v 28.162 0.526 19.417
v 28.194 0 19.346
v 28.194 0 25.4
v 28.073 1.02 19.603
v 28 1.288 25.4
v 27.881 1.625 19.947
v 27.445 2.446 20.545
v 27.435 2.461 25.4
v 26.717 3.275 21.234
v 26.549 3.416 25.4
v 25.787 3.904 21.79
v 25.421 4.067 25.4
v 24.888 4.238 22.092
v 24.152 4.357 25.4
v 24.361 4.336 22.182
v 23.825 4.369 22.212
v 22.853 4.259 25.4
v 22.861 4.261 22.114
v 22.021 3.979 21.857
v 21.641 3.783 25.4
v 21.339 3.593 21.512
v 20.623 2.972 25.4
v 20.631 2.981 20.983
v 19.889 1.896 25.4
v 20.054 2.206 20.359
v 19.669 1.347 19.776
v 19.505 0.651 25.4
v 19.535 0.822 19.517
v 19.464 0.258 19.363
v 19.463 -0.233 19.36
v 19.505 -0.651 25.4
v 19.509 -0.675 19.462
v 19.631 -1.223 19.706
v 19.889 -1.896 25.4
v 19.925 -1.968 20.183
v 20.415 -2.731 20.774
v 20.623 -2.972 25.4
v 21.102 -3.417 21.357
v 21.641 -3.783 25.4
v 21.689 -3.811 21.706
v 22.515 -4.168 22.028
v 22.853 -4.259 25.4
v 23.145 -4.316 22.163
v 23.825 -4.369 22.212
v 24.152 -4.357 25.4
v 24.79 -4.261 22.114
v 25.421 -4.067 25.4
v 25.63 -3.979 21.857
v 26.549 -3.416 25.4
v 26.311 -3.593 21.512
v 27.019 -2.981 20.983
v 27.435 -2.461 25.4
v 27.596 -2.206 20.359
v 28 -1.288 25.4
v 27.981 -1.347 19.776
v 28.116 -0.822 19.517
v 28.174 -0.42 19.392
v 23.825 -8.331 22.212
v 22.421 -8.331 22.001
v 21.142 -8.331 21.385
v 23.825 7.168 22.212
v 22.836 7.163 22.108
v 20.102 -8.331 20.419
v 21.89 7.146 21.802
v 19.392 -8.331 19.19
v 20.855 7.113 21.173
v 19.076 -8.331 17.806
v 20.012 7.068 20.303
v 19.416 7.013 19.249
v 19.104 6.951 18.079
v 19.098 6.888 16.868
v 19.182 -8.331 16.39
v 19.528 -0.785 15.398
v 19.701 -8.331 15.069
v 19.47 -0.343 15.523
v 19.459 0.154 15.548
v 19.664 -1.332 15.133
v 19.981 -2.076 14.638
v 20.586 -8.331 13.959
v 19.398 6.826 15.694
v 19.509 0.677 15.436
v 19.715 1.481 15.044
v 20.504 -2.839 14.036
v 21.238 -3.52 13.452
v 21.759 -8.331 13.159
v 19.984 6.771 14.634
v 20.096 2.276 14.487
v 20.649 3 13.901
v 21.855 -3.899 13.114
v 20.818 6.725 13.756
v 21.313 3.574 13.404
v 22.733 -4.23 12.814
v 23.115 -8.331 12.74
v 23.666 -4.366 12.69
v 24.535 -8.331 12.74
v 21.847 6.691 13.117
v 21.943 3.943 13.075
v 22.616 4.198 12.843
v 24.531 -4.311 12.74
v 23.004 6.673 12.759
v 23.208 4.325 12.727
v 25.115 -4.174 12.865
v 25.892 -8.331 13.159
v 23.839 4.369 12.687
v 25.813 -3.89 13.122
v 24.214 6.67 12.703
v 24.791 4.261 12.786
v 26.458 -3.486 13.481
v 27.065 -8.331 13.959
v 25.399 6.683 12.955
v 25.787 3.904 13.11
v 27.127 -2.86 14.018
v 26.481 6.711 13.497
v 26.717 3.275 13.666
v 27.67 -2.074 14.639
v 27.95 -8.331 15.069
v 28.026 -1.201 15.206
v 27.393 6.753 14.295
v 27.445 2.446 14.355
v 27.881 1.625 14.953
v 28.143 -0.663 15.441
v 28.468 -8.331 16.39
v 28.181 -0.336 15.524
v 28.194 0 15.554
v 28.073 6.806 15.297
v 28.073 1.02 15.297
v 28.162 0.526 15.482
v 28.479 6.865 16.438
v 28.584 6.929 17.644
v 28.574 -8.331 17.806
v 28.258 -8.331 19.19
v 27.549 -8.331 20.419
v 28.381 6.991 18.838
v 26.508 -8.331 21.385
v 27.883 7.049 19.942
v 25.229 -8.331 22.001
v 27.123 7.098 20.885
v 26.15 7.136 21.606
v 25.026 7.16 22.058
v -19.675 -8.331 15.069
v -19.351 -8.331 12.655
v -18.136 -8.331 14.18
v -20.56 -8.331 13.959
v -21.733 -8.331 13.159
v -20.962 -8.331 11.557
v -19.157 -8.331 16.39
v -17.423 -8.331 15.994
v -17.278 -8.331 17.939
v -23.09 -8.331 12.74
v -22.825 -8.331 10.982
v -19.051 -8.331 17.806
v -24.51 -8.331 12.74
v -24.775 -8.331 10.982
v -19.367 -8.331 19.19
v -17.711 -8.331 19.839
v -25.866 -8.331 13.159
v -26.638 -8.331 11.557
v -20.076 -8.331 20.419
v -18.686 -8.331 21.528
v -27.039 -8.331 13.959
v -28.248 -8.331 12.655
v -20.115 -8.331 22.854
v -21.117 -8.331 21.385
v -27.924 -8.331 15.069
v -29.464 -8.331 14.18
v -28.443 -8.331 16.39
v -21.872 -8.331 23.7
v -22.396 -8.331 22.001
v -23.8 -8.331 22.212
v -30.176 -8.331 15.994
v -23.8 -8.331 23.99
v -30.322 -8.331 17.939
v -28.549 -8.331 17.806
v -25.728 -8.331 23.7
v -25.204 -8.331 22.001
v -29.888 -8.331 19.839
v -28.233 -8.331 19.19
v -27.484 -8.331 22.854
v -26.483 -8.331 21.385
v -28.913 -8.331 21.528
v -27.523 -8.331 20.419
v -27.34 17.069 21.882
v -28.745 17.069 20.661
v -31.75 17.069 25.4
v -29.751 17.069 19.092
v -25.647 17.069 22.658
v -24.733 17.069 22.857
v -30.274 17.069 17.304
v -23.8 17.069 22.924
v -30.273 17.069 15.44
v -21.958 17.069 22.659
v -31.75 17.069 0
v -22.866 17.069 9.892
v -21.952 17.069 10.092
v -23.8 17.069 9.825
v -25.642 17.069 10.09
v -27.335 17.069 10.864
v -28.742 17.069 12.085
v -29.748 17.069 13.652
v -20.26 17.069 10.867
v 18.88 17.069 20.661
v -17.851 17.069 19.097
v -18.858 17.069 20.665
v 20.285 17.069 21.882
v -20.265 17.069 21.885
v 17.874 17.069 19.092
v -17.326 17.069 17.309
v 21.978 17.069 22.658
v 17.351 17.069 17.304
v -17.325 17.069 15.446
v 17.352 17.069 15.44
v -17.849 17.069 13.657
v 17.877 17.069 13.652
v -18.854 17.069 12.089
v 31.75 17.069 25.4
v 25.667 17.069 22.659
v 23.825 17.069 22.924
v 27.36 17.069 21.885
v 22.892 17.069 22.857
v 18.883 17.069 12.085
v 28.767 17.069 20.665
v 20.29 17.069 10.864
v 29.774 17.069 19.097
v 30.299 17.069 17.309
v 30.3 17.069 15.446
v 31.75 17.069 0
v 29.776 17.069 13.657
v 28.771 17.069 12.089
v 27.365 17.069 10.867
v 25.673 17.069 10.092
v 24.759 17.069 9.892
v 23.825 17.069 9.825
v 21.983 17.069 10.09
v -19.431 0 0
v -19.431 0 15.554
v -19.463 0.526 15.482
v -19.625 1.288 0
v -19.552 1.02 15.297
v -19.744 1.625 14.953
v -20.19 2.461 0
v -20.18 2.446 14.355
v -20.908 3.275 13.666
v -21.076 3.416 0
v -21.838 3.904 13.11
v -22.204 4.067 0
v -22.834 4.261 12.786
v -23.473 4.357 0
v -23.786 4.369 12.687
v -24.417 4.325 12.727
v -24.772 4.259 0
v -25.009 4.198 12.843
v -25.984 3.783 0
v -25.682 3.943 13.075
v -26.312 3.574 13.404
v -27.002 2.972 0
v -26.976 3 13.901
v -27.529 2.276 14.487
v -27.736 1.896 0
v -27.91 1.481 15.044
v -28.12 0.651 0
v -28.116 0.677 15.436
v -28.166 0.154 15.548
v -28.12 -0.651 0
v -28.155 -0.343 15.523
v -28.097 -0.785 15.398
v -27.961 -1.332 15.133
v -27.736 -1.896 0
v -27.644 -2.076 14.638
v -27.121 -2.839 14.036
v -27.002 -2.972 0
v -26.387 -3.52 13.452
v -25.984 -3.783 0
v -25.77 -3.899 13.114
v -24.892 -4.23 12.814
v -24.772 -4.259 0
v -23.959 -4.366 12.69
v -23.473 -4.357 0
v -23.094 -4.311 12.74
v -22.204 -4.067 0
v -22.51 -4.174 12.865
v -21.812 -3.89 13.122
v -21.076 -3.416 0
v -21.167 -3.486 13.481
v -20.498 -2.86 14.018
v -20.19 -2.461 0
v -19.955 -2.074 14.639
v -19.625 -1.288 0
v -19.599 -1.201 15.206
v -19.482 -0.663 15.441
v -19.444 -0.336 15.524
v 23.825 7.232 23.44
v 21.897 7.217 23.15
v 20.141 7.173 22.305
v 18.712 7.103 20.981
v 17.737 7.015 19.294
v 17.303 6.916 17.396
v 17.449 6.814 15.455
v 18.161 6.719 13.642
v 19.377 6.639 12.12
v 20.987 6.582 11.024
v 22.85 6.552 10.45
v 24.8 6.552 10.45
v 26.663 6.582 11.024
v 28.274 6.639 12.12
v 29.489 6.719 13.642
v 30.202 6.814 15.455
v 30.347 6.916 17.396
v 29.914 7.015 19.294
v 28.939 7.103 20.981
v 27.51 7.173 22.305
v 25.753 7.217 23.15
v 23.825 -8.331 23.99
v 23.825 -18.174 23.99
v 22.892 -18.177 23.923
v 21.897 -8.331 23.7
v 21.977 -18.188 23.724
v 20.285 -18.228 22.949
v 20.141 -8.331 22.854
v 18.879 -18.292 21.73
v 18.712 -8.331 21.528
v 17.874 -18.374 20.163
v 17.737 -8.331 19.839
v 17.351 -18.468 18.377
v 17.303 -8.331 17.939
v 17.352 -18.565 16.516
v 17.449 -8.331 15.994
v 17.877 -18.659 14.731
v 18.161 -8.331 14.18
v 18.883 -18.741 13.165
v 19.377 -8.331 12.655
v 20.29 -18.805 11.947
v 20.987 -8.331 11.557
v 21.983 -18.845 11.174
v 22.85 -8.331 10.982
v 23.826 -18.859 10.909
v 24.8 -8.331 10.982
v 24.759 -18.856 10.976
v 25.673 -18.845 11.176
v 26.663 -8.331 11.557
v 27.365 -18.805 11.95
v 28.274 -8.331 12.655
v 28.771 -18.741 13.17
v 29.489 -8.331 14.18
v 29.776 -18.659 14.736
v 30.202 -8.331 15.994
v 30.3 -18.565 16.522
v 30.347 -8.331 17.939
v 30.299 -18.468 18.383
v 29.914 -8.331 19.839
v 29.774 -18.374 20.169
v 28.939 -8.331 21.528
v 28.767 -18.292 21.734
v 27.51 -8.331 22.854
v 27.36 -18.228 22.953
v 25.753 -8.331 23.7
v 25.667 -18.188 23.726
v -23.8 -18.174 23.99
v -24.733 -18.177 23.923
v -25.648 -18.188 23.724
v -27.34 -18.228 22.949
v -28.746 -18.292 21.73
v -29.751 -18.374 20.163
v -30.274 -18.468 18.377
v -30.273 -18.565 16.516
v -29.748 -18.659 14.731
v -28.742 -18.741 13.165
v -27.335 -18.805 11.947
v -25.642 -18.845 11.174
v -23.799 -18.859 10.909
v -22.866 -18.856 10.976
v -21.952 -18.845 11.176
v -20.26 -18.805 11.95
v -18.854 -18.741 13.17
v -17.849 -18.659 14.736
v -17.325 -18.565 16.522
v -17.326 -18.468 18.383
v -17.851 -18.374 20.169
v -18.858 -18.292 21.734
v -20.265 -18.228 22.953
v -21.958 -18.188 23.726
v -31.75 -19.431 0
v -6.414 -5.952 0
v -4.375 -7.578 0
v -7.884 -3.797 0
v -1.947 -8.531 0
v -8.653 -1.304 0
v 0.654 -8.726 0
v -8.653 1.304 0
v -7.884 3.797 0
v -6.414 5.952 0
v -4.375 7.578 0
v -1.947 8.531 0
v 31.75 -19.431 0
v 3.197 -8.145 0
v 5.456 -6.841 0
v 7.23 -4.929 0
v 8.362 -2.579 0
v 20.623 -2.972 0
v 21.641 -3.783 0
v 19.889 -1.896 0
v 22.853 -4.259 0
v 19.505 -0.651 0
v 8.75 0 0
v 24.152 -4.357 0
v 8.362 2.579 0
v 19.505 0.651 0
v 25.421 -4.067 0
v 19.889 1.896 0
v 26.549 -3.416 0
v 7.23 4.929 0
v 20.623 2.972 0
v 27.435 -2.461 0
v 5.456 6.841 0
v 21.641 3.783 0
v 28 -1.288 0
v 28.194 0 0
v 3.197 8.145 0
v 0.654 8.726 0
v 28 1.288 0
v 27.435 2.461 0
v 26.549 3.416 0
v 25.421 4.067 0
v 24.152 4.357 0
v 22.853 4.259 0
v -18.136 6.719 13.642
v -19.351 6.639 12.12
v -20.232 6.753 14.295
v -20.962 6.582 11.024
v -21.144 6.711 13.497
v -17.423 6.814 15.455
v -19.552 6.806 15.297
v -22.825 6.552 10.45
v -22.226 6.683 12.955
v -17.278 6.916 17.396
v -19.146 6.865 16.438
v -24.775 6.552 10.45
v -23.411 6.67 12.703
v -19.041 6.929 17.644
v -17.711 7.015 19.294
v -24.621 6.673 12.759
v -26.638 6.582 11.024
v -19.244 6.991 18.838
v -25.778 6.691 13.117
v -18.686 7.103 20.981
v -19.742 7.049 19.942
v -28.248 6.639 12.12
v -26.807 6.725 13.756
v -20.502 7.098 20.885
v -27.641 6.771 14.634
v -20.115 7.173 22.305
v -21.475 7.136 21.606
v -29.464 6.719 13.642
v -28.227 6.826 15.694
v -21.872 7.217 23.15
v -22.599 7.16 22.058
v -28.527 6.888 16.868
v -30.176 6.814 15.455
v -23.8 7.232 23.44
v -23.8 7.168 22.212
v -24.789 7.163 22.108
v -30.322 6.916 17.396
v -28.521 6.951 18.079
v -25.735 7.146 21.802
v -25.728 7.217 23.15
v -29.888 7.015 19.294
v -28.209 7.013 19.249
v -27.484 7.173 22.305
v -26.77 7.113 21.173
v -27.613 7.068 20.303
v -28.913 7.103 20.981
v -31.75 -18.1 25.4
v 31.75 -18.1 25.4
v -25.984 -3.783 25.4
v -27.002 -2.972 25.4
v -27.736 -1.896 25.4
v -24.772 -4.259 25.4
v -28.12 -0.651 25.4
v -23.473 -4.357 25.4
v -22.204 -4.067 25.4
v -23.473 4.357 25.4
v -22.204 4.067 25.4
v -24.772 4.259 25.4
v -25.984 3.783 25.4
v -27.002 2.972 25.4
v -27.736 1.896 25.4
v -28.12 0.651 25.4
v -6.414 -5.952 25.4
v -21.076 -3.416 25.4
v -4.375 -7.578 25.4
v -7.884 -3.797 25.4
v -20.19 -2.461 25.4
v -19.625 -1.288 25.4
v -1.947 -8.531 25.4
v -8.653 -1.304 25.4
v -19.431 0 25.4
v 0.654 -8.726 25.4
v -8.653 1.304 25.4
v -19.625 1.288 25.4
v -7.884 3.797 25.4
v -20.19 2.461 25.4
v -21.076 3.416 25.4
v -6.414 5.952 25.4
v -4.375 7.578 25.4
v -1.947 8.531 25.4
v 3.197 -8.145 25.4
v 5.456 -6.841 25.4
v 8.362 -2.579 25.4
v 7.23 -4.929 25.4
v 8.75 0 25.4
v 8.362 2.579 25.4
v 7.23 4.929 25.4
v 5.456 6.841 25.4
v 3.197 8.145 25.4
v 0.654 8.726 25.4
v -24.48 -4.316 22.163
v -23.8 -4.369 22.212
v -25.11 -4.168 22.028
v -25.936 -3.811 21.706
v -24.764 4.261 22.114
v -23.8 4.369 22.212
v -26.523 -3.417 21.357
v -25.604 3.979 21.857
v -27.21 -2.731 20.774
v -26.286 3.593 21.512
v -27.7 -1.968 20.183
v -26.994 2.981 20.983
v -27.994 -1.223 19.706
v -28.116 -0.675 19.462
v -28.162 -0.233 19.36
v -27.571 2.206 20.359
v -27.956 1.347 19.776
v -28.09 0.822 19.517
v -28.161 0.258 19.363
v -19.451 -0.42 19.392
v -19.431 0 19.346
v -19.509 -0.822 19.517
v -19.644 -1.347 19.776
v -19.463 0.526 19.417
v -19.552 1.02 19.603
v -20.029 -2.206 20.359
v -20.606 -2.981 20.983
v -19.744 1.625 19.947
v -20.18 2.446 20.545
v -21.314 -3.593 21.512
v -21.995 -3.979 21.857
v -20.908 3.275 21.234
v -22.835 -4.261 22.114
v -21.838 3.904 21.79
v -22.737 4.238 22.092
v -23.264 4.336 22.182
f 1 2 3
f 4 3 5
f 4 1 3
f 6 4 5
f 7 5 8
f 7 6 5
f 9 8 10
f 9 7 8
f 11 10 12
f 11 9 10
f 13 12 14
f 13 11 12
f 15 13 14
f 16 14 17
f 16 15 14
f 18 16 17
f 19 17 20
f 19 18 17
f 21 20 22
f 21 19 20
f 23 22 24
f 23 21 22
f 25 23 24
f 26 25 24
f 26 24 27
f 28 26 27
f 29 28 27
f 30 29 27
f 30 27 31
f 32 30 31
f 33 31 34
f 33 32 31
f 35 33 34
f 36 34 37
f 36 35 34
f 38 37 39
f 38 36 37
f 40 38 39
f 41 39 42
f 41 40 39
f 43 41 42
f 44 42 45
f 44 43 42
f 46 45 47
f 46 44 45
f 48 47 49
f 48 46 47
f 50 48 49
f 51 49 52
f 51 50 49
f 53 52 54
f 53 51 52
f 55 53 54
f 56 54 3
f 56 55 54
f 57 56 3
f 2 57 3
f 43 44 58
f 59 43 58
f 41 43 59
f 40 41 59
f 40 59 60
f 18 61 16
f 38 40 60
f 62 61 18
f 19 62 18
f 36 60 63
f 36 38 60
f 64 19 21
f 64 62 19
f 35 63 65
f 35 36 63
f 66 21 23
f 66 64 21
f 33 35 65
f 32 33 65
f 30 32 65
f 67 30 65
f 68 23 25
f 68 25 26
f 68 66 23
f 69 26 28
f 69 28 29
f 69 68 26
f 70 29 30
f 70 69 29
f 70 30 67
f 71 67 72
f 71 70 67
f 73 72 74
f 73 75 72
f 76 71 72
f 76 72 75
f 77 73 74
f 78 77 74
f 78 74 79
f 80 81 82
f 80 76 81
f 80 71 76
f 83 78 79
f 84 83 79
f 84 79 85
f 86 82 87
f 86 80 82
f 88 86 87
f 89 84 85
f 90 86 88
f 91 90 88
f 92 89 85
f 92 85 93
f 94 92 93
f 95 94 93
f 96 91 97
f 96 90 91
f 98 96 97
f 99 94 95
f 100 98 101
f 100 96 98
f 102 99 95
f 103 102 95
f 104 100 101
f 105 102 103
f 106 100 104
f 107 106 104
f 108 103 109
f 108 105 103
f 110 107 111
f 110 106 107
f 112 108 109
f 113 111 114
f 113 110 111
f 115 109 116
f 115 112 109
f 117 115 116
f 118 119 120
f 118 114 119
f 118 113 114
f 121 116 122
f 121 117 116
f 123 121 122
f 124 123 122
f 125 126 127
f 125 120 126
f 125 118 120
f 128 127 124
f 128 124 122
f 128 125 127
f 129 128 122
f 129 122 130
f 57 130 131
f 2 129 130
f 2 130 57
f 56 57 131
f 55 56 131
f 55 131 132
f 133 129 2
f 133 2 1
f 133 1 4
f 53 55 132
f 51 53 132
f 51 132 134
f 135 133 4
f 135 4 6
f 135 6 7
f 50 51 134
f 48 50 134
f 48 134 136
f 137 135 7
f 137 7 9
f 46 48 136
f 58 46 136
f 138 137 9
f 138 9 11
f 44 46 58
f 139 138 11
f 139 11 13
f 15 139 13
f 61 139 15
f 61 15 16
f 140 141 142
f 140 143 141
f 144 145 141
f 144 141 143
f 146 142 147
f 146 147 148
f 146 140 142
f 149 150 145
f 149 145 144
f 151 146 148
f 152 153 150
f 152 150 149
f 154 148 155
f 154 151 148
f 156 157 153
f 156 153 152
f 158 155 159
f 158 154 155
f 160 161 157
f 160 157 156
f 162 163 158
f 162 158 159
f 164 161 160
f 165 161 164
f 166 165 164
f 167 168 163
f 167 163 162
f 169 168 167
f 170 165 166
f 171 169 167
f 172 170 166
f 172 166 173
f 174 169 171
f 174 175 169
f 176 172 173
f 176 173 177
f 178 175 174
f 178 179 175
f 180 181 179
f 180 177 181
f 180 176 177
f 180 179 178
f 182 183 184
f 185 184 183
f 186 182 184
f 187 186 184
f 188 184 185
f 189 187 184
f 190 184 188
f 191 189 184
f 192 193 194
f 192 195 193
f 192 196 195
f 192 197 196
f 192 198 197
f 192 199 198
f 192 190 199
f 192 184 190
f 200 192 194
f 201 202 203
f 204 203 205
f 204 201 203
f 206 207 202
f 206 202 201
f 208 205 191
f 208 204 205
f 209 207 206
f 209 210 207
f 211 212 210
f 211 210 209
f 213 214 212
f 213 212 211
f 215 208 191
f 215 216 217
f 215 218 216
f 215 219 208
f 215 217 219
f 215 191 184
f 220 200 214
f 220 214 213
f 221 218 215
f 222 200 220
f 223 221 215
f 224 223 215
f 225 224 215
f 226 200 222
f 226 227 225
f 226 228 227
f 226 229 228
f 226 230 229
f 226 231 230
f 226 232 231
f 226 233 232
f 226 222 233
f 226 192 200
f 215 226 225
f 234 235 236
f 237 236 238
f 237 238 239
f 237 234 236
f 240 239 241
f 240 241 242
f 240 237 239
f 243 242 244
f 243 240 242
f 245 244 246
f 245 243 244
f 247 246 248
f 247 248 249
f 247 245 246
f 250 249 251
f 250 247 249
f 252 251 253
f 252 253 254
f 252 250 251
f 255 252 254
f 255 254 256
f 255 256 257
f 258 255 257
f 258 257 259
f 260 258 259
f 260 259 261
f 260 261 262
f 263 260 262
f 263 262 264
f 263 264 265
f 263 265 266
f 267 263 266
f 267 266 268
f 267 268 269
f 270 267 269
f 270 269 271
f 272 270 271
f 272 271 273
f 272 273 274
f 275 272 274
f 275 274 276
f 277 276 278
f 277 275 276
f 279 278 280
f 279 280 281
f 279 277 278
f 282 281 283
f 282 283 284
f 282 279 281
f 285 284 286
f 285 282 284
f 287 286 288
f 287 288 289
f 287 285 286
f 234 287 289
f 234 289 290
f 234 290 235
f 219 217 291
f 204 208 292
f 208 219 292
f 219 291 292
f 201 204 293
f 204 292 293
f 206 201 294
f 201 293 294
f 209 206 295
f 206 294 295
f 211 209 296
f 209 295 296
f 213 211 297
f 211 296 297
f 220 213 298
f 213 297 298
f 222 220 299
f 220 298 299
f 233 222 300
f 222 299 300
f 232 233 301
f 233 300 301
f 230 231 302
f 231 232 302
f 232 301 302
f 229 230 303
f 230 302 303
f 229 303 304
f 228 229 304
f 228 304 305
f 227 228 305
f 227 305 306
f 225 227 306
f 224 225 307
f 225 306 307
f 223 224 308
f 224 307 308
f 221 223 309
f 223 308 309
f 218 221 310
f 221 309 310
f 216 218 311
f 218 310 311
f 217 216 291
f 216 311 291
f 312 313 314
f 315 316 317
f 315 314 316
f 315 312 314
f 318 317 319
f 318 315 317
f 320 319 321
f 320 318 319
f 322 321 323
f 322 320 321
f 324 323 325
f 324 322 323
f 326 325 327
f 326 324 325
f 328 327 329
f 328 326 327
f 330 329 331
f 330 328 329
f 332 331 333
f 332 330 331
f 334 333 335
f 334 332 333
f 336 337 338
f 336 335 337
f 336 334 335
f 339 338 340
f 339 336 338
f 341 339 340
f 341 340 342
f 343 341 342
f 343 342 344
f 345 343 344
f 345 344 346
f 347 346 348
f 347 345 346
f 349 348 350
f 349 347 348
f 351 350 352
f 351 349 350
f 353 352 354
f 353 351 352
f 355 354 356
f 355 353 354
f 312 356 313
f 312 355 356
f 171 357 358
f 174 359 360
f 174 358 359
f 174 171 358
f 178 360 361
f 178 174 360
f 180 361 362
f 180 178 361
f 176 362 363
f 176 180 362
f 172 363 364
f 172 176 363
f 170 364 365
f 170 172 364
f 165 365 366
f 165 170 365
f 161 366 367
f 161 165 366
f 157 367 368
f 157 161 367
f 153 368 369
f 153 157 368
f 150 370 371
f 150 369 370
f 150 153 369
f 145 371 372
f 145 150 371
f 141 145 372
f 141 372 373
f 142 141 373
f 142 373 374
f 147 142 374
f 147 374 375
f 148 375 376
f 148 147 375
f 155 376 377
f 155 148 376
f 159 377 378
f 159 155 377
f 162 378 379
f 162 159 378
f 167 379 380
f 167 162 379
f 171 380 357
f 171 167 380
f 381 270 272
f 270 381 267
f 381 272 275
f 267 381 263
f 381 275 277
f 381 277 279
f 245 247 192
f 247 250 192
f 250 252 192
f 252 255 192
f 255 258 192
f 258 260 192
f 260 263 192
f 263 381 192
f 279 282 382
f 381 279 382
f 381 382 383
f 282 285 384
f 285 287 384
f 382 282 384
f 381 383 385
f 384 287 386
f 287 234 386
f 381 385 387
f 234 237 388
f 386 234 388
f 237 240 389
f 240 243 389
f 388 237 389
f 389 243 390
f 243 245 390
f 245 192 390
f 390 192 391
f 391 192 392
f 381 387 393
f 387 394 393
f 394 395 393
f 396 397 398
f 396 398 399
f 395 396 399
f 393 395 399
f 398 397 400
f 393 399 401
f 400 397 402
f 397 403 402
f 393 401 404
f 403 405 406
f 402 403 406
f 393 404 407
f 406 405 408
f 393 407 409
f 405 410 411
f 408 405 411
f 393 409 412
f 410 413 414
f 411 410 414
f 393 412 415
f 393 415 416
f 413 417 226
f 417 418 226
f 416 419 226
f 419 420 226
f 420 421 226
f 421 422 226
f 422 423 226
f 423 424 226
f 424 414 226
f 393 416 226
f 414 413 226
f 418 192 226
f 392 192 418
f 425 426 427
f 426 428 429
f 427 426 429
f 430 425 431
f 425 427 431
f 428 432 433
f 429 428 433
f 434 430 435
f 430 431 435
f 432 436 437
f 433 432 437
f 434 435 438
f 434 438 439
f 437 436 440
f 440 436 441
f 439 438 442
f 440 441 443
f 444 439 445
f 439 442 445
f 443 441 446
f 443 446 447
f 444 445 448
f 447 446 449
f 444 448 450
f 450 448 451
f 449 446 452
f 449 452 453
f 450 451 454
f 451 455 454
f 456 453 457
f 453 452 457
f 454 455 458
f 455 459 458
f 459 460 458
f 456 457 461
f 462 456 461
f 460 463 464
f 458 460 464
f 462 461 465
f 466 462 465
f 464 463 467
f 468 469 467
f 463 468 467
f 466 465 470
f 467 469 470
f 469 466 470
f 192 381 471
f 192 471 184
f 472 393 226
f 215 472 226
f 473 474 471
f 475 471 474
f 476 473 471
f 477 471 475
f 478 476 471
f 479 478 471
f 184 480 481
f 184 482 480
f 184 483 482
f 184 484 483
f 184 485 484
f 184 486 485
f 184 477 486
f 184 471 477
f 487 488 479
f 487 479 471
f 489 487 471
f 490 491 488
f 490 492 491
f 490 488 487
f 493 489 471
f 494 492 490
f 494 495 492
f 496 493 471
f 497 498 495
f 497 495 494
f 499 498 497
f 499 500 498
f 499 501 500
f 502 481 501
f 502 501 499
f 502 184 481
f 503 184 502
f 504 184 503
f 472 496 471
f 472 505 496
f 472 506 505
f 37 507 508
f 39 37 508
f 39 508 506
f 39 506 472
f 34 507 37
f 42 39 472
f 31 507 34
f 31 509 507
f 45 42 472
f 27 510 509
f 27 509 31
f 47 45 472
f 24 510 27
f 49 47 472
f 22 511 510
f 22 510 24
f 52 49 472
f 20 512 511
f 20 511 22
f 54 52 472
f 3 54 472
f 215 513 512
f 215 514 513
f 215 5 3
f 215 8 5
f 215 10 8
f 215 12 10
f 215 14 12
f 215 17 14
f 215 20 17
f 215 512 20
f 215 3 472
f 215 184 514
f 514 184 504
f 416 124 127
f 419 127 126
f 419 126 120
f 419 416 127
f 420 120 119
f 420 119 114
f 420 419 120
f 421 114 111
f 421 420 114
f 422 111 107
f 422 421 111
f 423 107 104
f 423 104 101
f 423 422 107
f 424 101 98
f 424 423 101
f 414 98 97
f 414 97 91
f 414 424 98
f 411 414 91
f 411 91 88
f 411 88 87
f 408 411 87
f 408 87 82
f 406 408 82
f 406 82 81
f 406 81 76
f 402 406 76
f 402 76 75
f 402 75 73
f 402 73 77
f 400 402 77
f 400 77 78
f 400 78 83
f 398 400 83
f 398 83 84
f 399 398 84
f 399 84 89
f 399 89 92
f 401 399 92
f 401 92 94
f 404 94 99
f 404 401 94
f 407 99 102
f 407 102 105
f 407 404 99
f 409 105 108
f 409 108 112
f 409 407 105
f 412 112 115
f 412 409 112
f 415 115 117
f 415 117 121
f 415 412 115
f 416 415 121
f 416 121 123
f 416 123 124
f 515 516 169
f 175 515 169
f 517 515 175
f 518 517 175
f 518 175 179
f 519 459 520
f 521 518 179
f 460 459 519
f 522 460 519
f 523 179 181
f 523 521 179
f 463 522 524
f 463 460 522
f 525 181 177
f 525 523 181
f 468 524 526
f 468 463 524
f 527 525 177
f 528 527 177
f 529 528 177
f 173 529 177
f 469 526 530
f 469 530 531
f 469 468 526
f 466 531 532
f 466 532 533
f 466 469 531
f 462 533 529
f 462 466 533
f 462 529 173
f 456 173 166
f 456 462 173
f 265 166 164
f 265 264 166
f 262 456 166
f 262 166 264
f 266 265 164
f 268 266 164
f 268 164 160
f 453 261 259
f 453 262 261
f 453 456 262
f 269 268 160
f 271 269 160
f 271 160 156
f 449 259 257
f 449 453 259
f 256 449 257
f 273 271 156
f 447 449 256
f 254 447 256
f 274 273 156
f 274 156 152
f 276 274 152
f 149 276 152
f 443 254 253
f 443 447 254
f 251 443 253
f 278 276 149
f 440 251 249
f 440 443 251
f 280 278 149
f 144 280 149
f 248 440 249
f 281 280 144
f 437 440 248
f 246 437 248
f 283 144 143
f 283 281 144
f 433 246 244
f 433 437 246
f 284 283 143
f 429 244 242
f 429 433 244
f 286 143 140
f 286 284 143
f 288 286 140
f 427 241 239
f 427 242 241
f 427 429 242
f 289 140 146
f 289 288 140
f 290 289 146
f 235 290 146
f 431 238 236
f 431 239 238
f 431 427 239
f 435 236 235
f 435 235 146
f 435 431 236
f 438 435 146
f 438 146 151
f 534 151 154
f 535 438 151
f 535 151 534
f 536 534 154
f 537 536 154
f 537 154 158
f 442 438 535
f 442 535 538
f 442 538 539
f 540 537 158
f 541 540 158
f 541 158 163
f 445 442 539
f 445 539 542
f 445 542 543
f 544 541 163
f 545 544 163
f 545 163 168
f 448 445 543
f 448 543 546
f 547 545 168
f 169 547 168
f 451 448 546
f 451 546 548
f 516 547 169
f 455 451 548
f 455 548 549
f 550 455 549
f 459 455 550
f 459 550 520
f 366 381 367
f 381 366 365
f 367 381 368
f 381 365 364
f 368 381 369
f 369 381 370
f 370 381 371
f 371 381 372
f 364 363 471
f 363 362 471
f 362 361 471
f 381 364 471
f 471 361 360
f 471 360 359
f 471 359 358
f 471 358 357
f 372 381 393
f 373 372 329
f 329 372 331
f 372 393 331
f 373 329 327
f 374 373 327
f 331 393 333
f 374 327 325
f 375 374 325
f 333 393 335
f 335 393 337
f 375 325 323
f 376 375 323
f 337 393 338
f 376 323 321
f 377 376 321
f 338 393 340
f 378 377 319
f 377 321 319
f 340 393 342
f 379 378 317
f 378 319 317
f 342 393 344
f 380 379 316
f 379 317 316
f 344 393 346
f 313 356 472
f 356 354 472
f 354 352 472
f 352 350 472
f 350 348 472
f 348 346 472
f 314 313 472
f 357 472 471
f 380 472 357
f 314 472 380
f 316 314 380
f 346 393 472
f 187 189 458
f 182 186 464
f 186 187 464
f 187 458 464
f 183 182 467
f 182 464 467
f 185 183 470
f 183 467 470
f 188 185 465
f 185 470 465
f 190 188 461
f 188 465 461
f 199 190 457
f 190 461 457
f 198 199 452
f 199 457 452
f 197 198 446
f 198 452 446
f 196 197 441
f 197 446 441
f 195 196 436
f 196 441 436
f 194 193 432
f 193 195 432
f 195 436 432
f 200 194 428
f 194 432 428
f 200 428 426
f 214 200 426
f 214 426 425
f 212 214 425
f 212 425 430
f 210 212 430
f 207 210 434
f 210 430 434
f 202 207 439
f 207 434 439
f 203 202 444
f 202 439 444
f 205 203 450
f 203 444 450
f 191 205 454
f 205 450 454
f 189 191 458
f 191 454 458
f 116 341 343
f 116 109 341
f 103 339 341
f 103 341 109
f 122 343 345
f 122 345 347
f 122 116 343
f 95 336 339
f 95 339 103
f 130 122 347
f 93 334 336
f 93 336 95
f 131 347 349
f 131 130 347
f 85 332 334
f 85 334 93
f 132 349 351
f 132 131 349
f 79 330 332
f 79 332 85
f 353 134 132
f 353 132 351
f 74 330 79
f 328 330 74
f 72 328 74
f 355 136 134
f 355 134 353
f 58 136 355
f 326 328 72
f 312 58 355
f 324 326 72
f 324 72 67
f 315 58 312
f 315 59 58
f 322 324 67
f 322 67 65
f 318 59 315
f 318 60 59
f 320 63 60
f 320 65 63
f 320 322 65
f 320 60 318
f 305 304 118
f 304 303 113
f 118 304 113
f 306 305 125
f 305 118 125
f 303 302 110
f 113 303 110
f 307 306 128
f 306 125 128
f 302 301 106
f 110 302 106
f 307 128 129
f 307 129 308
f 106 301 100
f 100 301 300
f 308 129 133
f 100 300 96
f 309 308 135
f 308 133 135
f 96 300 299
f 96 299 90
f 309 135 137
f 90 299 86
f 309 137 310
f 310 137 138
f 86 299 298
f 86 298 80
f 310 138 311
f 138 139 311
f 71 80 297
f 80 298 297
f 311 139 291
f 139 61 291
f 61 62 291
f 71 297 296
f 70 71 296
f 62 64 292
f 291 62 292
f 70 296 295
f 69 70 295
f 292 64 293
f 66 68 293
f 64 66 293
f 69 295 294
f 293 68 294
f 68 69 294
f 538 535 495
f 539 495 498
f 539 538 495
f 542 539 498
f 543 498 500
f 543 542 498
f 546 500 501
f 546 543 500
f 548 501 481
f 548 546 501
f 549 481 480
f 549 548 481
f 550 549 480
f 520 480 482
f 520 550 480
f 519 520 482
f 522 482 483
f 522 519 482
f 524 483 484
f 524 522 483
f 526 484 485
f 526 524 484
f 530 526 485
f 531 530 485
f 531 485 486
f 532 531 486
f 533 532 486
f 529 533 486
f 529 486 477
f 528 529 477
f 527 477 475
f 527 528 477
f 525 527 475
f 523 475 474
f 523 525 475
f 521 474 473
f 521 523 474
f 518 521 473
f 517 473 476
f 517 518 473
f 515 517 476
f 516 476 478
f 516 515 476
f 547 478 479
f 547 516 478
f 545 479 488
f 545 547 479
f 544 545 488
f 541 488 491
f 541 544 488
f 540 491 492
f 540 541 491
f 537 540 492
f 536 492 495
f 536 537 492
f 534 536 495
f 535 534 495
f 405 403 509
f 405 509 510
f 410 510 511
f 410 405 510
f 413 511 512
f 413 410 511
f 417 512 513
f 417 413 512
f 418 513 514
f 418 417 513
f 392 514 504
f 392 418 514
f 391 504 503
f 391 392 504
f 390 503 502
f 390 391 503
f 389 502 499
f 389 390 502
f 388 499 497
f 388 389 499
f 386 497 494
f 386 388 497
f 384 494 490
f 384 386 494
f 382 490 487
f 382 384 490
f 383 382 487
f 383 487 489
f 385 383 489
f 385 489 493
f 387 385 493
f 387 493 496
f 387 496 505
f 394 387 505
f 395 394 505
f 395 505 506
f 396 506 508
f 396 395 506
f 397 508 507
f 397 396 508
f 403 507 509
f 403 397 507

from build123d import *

# Parameters (mm, degrees)
SKETCH1_W          = 63.5
SKETCH1_H          = 36.4998
SKETCH1_R          = 8.7503
SKETCH1_R_2        = 4.3688
EXTRUDE1_DEPTH     = 25.4
CUT_EXTRUDE1_DEPTH = 64.5
LPATTERN1_COUNT    = 2
LPATTERN1_PITCH    = 47.625


with BuildPart() as part:
    # Sketch1 → Extrude1 (new body)
    with BuildSketch(Plane.XY):
        with Locations((0, -1.1811)):
            Rectangle(SKETCH1_W, SKETCH1_H)
        Circle(SKETCH1_R, mode=Mode.SUBTRACT)
        with Locations((-23.7998, 0)):
            Circle(SKETCH1_R_2, mode=Mode.SUBTRACT)
        with Locations((23.8252, 0)):
            Circle(SKETCH1_R_2, mode=Mode.SUBTRACT)
    extrude(amount=EXTRUDE1_DEPTH)

    # Sketch2 → Cut-Extrude1 (cut, through all)
    with BuildSketch(Plane(origin=(31.75, 0, 0), x_dir=(0, 0, -1), z_dir=(1, 0, 0))):
        Polygon((0, -19.431), (-25.4, -18.099842406), (-25.4, -19.431), align=None)
    extrude(amount=-CUT_EXTRUDE1_DEPTH, mode=Mode.SUBTRACT)

    # Sketch3 → Cut-Revolve1 (revolve, cut)
    with BuildSketch(Plane(origin=(-23.7998, 0, 0), x_dir=(0, 0, -1), z_dir=(1, 0, 0)), mode=Mode.PRIVATE) as cut_revolve1_sk:
        Polygon((-10.9093, -18.859267813), (-10.9093, -8.3312), (-12.6873, -8.3312), (-12.6873, 17.0688), (-17.4498, 17.0688), (-17.4498, -18.859267813), align=None)
    cut_revolve1 = revolve(cut_revolve1_sk.sketch.rotate(Axis((-23.7998, 16.931830478, 17.4498), (0, -1, 0)), 180), axis=Axis((-23.7998, 16.931830478, 17.4498), (0, -1, 0)), mode=Mode.SUBTRACT)  # turned: the seam where the file's is

    # Sketch4 → Cut-Revolve2 (revolve, cut)
    with BuildSketch(Plane(origin=(-23.7998, 0, 0), x_dir=(0, 0, -1), z_dir=(1, 0, 0)), mode=Mode.PRIVATE) as cut_revolve2_sk:
        Polygon((-9.825313315, 17.0688), (-10.376701981, 6.547677495), (-16.908238453, 6.889980817), (-16.356849787, 17.411103322), align=None)
    cut_revolve2 = revolve(cut_revolve2_sk.sketch.rotate(Axis((-23.7998, 21.413272844, 16.14710497), (0, -0.998629535, 0.052335956)), 180), axis=Axis((-23.7998, 21.413272844, 16.14710497), (0, -0.998629535, 0.052335956)), mode=Mode.SUBTRACT)  # turned: the seam where the file's is

    # LPattern1: Cut-Revolve1, Cut-Revolve2 ×2
    with Locations(*[(i * LPATTERN1_PITCH, 0, 0) for i in range(1, LPATTERN1_COUNT)]):
        add(cut_revolve1, mode=Mode.SUBTRACT)
        add(cut_revolve2, mode=Mode.SUBTRACT)


solid = part.part
